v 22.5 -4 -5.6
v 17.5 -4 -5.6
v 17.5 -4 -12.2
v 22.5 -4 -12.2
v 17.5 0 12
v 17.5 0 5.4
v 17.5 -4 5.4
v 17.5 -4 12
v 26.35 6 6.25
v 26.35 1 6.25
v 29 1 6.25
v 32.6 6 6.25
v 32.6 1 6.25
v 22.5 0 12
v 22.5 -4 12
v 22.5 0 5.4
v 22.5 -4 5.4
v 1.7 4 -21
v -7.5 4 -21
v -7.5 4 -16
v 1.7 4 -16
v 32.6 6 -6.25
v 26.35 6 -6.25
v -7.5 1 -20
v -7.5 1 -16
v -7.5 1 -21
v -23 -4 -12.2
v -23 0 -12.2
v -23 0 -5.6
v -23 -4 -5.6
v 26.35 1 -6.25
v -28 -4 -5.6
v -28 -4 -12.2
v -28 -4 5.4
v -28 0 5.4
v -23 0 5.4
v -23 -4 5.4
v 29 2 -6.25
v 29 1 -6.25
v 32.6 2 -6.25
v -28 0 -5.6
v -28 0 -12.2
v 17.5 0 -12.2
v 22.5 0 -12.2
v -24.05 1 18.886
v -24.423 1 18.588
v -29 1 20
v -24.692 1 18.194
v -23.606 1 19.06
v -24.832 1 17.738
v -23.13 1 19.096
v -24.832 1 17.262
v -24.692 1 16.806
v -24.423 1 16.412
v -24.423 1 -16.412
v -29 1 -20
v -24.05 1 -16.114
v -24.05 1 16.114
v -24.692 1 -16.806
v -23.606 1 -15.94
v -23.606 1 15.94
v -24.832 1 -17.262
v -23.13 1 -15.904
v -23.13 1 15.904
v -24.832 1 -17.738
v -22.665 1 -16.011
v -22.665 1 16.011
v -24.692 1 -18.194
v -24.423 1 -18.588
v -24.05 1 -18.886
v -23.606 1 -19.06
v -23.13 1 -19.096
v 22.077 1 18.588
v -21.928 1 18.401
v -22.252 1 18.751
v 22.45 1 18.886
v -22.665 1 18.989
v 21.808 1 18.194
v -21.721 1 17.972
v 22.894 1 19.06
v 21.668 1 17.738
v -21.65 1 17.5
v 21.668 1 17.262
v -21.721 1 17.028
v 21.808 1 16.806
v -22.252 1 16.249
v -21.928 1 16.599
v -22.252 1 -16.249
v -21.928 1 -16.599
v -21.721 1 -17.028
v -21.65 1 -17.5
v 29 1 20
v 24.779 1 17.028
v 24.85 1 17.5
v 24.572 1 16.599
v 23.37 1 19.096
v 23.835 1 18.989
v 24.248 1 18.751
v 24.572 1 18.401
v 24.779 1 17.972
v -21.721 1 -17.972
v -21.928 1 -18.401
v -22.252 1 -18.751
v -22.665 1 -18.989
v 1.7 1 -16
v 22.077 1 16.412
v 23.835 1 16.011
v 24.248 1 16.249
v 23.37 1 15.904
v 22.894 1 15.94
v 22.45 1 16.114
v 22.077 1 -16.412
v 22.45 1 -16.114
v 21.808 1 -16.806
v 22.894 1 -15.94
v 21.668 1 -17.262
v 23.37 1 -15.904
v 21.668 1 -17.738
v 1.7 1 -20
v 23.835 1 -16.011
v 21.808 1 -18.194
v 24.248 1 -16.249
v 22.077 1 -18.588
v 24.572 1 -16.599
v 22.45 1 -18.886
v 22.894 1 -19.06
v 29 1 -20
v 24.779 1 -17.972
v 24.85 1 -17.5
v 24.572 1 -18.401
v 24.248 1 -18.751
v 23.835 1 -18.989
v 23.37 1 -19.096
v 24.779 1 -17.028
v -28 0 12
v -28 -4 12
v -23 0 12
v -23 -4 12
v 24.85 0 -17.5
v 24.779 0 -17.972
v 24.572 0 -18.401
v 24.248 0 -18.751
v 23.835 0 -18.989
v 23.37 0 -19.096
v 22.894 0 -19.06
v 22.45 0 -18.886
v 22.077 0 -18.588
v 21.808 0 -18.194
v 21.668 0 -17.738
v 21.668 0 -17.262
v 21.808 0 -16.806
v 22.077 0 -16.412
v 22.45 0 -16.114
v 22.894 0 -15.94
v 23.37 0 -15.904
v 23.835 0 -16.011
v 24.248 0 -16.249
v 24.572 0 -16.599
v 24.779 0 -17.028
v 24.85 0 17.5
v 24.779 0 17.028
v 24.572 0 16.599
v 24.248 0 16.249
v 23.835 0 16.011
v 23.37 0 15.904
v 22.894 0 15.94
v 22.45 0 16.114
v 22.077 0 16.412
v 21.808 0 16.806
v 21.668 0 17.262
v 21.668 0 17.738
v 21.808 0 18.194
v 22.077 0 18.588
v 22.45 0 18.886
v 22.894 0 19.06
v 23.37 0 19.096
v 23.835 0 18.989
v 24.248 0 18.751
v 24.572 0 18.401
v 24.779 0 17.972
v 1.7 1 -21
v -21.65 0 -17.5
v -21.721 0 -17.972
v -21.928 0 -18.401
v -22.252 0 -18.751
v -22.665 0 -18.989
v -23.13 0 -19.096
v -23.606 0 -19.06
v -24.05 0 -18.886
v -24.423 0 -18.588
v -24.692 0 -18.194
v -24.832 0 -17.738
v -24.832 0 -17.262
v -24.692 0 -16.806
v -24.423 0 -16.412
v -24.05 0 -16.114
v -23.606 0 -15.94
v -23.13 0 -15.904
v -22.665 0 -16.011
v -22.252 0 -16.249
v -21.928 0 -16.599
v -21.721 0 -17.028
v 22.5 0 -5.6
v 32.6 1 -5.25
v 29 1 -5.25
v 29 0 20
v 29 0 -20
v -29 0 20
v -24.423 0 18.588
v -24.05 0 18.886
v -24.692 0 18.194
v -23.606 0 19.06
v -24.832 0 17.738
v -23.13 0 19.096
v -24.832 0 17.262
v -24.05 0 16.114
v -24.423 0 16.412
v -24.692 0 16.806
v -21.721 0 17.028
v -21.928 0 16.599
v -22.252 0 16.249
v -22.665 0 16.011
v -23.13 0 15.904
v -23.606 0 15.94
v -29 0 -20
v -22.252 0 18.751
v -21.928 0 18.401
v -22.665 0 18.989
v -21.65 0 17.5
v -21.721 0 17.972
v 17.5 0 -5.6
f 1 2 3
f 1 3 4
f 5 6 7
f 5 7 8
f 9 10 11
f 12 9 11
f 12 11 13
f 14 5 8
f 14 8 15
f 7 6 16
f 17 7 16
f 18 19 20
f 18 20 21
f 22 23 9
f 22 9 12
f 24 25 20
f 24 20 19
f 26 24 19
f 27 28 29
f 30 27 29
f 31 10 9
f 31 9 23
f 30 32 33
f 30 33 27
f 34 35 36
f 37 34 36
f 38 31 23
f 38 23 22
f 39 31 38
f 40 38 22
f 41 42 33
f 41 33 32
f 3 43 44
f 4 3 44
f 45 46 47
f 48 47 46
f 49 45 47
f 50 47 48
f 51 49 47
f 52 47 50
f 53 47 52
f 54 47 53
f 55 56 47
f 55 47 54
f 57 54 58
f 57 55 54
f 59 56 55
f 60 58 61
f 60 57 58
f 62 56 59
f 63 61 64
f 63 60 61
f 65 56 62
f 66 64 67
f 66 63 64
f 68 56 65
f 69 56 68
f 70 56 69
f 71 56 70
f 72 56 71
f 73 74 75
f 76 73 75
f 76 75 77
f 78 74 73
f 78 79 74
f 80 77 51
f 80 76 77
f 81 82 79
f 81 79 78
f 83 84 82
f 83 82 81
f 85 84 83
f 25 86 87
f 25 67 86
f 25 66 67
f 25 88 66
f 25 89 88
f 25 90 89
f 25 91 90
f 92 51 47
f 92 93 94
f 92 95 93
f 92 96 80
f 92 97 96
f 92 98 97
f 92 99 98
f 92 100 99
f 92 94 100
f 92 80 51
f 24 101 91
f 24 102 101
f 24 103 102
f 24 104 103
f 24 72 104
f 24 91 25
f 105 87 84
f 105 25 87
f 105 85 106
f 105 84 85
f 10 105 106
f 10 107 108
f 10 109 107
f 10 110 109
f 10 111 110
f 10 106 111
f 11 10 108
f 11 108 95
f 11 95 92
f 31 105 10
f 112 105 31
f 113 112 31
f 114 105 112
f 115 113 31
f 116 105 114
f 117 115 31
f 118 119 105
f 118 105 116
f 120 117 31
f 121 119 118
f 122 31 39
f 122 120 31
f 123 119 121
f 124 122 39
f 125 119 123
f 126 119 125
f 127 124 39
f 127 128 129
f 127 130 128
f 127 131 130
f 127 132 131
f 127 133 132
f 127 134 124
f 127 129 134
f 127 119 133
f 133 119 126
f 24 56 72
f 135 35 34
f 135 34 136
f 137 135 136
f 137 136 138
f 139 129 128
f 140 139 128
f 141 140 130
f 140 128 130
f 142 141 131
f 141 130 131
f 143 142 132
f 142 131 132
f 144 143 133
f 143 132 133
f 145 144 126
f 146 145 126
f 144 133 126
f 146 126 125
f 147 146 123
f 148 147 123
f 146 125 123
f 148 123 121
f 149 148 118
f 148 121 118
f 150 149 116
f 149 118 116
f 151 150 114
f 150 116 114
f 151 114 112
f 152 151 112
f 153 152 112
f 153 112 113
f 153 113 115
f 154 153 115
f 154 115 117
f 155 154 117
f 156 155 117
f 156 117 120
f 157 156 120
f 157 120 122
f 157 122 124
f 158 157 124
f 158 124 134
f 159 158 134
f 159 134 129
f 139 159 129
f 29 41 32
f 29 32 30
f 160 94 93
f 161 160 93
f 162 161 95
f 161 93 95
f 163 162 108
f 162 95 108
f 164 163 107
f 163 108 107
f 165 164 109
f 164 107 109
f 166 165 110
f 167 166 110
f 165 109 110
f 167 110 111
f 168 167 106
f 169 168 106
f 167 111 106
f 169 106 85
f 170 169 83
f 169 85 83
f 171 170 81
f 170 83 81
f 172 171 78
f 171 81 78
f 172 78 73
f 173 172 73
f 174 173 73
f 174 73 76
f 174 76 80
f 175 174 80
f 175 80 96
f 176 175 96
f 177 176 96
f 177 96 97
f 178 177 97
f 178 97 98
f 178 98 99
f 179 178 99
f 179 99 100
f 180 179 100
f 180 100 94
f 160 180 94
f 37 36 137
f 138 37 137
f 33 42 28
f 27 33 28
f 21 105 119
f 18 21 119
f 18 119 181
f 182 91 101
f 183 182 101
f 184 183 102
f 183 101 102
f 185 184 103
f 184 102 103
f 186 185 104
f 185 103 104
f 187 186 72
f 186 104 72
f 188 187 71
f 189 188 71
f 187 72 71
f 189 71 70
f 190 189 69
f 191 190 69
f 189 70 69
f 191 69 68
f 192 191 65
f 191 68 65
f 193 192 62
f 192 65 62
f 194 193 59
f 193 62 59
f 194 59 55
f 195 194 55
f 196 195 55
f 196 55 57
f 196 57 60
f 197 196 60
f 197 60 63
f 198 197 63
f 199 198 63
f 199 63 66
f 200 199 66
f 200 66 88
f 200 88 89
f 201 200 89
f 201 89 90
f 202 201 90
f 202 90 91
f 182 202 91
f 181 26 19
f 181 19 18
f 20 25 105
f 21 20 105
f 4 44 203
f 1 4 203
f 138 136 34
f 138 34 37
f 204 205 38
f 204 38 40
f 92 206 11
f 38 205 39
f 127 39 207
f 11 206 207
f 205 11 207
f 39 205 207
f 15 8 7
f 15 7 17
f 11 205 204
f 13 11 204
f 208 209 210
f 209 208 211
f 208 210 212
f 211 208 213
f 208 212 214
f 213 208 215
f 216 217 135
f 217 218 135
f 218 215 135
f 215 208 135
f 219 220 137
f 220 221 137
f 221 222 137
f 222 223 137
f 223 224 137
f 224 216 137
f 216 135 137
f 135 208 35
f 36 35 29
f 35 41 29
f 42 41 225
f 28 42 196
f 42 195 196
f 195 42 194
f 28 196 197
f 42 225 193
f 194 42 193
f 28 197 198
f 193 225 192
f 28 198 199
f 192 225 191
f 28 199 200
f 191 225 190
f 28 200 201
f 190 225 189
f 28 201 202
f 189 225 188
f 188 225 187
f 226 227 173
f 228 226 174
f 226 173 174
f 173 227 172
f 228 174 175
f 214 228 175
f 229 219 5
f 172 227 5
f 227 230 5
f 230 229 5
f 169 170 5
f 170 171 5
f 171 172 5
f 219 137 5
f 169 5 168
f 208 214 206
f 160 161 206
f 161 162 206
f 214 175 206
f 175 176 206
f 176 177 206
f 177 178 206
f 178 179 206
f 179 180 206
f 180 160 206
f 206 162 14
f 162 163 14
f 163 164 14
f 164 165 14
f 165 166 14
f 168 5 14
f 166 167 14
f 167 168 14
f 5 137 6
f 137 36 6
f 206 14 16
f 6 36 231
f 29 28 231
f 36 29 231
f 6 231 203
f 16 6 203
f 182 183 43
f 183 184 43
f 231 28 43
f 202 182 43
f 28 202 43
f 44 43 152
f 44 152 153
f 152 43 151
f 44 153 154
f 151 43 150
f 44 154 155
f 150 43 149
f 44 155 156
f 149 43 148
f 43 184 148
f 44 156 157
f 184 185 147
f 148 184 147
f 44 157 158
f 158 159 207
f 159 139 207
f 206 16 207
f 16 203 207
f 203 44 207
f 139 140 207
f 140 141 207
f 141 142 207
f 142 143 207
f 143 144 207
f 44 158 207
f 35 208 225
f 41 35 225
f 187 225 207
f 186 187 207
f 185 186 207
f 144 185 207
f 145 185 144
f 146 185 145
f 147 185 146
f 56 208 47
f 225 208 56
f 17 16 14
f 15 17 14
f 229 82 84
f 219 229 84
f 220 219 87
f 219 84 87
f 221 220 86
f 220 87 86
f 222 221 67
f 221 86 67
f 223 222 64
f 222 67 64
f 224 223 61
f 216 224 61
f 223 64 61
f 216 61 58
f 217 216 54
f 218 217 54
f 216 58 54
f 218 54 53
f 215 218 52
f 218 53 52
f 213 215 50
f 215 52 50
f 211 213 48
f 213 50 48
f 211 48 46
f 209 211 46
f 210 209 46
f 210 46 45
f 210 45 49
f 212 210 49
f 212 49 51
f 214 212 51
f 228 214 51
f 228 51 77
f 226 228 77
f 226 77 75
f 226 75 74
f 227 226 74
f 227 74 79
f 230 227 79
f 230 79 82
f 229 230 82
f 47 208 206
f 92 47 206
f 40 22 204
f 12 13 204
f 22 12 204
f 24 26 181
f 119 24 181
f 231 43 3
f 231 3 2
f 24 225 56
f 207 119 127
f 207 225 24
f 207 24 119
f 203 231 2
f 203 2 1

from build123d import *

# Parameters (mm, degrees)
SKETCH1_W           = 58
SKETCH1_H           = 40
BOSS_EXTRUDE1_DEPTH = 1
SKETCH2_W           = 6.25
SKETCH2_H           = 12.5
BOSS_EXTRUDE2_DEPTH = 5
CHAMFER1_SIZE       = 1
SKETCH3_W           = 9.2
SKETCH3_H           = 5
BOSS_EXTRUDE3_DEPTH = 3
SKETCH4_W           = 5
SKETCH4_H           = 6.6
BOSS_EXTRUDE4_DEPTH = 4
SKETCH5_R           = 1.6
CUT_EXTRUDE1_DEPTH  = 6


with BuildPart() as part:
    # Sketch1 → Boss-Extrude1 (new body)
    with BuildSketch(Plane(origin=(0, 0, 0), x_dir=(1, 0, 0), z_dir=(0, 1, 0))):
        Rectangle(SKETCH1_W, SKETCH1_H)
    extrude(amount=BOSS_EXTRUDE1_DEPTH)

    # Sketch2 → Boss-Extrude2 (add)
    with BuildSketch(Plane(origin=(0, 1, 0), x_dir=(1, 0, 0), z_dir=(0, 1, 0))):
        with Locations((29.475, 0)):
            Rectangle(SKETCH2_W, SKETCH2_H)
    extrude(amount=BOSS_EXTRUDE2_DEPTH)

    # Chamfer1
    chamfer1_edges = [part.edges().sort_by_distance(p)[0] for p in [
        (30.8, 1, -6.25),
    ]]
    chamfer(chamfer1_edges, length=CHAMFER1_SIZE)

    # Sketch3 → Boss-Extrude3 (add)
    with BuildSketch(Plane(origin=(0, 1, 0), x_dir=(1, 0, 0), z_dir=(0, 1, 0))):
        with Locations((-2.9, 18.5)):
            Rectangle(SKETCH3_W, SKETCH3_H)
    extrude(amount=BOSS_EXTRUDE3_DEPTH)

    # Sketch4 → Boss-Extrude4 (add)
    with BuildSketch(Plane.XZ):
        with Locations((-25.5, 8.7)):
            Rectangle(SKETCH4_W, SKETCH4_H)
        with Locations((-25.5, -8.9)):
            Rectangle(SKETCH4_W, SKETCH4_H)
        with Locations((20, 8.7)):
            Rectangle(SKETCH4_W, SKETCH4_H)
        with Locations((20, -8.9)):
            Rectangle(SKETCH4_W, SKETCH4_H)
    extrude(amount=BOSS_EXTRUDE4_DEPTH)

    # Sketch5 → Cut-Extrude1 (cut, through all)
    with BuildSketch(Plane(origin=(0, 1, 0), x_dir=(1, 0, 0), z_dir=(0, 1, 0))):
        with Locations((-23.25, 17.5)):
            Circle(SKETCH5_R)
        with Locations((-23.25, -17.5)):
            Circle(SKETCH5_R)
        with Locations((23.25, -17.5)):
            Circle(SKETCH5_R)
        with Locations((23.25, 17.5)):
            Circle(SKETCH5_R)
    extrude(amount=-CUT_EXTRUDE1_DEPTH, mode=Mode.SUBTRACT)


solid = part.part
